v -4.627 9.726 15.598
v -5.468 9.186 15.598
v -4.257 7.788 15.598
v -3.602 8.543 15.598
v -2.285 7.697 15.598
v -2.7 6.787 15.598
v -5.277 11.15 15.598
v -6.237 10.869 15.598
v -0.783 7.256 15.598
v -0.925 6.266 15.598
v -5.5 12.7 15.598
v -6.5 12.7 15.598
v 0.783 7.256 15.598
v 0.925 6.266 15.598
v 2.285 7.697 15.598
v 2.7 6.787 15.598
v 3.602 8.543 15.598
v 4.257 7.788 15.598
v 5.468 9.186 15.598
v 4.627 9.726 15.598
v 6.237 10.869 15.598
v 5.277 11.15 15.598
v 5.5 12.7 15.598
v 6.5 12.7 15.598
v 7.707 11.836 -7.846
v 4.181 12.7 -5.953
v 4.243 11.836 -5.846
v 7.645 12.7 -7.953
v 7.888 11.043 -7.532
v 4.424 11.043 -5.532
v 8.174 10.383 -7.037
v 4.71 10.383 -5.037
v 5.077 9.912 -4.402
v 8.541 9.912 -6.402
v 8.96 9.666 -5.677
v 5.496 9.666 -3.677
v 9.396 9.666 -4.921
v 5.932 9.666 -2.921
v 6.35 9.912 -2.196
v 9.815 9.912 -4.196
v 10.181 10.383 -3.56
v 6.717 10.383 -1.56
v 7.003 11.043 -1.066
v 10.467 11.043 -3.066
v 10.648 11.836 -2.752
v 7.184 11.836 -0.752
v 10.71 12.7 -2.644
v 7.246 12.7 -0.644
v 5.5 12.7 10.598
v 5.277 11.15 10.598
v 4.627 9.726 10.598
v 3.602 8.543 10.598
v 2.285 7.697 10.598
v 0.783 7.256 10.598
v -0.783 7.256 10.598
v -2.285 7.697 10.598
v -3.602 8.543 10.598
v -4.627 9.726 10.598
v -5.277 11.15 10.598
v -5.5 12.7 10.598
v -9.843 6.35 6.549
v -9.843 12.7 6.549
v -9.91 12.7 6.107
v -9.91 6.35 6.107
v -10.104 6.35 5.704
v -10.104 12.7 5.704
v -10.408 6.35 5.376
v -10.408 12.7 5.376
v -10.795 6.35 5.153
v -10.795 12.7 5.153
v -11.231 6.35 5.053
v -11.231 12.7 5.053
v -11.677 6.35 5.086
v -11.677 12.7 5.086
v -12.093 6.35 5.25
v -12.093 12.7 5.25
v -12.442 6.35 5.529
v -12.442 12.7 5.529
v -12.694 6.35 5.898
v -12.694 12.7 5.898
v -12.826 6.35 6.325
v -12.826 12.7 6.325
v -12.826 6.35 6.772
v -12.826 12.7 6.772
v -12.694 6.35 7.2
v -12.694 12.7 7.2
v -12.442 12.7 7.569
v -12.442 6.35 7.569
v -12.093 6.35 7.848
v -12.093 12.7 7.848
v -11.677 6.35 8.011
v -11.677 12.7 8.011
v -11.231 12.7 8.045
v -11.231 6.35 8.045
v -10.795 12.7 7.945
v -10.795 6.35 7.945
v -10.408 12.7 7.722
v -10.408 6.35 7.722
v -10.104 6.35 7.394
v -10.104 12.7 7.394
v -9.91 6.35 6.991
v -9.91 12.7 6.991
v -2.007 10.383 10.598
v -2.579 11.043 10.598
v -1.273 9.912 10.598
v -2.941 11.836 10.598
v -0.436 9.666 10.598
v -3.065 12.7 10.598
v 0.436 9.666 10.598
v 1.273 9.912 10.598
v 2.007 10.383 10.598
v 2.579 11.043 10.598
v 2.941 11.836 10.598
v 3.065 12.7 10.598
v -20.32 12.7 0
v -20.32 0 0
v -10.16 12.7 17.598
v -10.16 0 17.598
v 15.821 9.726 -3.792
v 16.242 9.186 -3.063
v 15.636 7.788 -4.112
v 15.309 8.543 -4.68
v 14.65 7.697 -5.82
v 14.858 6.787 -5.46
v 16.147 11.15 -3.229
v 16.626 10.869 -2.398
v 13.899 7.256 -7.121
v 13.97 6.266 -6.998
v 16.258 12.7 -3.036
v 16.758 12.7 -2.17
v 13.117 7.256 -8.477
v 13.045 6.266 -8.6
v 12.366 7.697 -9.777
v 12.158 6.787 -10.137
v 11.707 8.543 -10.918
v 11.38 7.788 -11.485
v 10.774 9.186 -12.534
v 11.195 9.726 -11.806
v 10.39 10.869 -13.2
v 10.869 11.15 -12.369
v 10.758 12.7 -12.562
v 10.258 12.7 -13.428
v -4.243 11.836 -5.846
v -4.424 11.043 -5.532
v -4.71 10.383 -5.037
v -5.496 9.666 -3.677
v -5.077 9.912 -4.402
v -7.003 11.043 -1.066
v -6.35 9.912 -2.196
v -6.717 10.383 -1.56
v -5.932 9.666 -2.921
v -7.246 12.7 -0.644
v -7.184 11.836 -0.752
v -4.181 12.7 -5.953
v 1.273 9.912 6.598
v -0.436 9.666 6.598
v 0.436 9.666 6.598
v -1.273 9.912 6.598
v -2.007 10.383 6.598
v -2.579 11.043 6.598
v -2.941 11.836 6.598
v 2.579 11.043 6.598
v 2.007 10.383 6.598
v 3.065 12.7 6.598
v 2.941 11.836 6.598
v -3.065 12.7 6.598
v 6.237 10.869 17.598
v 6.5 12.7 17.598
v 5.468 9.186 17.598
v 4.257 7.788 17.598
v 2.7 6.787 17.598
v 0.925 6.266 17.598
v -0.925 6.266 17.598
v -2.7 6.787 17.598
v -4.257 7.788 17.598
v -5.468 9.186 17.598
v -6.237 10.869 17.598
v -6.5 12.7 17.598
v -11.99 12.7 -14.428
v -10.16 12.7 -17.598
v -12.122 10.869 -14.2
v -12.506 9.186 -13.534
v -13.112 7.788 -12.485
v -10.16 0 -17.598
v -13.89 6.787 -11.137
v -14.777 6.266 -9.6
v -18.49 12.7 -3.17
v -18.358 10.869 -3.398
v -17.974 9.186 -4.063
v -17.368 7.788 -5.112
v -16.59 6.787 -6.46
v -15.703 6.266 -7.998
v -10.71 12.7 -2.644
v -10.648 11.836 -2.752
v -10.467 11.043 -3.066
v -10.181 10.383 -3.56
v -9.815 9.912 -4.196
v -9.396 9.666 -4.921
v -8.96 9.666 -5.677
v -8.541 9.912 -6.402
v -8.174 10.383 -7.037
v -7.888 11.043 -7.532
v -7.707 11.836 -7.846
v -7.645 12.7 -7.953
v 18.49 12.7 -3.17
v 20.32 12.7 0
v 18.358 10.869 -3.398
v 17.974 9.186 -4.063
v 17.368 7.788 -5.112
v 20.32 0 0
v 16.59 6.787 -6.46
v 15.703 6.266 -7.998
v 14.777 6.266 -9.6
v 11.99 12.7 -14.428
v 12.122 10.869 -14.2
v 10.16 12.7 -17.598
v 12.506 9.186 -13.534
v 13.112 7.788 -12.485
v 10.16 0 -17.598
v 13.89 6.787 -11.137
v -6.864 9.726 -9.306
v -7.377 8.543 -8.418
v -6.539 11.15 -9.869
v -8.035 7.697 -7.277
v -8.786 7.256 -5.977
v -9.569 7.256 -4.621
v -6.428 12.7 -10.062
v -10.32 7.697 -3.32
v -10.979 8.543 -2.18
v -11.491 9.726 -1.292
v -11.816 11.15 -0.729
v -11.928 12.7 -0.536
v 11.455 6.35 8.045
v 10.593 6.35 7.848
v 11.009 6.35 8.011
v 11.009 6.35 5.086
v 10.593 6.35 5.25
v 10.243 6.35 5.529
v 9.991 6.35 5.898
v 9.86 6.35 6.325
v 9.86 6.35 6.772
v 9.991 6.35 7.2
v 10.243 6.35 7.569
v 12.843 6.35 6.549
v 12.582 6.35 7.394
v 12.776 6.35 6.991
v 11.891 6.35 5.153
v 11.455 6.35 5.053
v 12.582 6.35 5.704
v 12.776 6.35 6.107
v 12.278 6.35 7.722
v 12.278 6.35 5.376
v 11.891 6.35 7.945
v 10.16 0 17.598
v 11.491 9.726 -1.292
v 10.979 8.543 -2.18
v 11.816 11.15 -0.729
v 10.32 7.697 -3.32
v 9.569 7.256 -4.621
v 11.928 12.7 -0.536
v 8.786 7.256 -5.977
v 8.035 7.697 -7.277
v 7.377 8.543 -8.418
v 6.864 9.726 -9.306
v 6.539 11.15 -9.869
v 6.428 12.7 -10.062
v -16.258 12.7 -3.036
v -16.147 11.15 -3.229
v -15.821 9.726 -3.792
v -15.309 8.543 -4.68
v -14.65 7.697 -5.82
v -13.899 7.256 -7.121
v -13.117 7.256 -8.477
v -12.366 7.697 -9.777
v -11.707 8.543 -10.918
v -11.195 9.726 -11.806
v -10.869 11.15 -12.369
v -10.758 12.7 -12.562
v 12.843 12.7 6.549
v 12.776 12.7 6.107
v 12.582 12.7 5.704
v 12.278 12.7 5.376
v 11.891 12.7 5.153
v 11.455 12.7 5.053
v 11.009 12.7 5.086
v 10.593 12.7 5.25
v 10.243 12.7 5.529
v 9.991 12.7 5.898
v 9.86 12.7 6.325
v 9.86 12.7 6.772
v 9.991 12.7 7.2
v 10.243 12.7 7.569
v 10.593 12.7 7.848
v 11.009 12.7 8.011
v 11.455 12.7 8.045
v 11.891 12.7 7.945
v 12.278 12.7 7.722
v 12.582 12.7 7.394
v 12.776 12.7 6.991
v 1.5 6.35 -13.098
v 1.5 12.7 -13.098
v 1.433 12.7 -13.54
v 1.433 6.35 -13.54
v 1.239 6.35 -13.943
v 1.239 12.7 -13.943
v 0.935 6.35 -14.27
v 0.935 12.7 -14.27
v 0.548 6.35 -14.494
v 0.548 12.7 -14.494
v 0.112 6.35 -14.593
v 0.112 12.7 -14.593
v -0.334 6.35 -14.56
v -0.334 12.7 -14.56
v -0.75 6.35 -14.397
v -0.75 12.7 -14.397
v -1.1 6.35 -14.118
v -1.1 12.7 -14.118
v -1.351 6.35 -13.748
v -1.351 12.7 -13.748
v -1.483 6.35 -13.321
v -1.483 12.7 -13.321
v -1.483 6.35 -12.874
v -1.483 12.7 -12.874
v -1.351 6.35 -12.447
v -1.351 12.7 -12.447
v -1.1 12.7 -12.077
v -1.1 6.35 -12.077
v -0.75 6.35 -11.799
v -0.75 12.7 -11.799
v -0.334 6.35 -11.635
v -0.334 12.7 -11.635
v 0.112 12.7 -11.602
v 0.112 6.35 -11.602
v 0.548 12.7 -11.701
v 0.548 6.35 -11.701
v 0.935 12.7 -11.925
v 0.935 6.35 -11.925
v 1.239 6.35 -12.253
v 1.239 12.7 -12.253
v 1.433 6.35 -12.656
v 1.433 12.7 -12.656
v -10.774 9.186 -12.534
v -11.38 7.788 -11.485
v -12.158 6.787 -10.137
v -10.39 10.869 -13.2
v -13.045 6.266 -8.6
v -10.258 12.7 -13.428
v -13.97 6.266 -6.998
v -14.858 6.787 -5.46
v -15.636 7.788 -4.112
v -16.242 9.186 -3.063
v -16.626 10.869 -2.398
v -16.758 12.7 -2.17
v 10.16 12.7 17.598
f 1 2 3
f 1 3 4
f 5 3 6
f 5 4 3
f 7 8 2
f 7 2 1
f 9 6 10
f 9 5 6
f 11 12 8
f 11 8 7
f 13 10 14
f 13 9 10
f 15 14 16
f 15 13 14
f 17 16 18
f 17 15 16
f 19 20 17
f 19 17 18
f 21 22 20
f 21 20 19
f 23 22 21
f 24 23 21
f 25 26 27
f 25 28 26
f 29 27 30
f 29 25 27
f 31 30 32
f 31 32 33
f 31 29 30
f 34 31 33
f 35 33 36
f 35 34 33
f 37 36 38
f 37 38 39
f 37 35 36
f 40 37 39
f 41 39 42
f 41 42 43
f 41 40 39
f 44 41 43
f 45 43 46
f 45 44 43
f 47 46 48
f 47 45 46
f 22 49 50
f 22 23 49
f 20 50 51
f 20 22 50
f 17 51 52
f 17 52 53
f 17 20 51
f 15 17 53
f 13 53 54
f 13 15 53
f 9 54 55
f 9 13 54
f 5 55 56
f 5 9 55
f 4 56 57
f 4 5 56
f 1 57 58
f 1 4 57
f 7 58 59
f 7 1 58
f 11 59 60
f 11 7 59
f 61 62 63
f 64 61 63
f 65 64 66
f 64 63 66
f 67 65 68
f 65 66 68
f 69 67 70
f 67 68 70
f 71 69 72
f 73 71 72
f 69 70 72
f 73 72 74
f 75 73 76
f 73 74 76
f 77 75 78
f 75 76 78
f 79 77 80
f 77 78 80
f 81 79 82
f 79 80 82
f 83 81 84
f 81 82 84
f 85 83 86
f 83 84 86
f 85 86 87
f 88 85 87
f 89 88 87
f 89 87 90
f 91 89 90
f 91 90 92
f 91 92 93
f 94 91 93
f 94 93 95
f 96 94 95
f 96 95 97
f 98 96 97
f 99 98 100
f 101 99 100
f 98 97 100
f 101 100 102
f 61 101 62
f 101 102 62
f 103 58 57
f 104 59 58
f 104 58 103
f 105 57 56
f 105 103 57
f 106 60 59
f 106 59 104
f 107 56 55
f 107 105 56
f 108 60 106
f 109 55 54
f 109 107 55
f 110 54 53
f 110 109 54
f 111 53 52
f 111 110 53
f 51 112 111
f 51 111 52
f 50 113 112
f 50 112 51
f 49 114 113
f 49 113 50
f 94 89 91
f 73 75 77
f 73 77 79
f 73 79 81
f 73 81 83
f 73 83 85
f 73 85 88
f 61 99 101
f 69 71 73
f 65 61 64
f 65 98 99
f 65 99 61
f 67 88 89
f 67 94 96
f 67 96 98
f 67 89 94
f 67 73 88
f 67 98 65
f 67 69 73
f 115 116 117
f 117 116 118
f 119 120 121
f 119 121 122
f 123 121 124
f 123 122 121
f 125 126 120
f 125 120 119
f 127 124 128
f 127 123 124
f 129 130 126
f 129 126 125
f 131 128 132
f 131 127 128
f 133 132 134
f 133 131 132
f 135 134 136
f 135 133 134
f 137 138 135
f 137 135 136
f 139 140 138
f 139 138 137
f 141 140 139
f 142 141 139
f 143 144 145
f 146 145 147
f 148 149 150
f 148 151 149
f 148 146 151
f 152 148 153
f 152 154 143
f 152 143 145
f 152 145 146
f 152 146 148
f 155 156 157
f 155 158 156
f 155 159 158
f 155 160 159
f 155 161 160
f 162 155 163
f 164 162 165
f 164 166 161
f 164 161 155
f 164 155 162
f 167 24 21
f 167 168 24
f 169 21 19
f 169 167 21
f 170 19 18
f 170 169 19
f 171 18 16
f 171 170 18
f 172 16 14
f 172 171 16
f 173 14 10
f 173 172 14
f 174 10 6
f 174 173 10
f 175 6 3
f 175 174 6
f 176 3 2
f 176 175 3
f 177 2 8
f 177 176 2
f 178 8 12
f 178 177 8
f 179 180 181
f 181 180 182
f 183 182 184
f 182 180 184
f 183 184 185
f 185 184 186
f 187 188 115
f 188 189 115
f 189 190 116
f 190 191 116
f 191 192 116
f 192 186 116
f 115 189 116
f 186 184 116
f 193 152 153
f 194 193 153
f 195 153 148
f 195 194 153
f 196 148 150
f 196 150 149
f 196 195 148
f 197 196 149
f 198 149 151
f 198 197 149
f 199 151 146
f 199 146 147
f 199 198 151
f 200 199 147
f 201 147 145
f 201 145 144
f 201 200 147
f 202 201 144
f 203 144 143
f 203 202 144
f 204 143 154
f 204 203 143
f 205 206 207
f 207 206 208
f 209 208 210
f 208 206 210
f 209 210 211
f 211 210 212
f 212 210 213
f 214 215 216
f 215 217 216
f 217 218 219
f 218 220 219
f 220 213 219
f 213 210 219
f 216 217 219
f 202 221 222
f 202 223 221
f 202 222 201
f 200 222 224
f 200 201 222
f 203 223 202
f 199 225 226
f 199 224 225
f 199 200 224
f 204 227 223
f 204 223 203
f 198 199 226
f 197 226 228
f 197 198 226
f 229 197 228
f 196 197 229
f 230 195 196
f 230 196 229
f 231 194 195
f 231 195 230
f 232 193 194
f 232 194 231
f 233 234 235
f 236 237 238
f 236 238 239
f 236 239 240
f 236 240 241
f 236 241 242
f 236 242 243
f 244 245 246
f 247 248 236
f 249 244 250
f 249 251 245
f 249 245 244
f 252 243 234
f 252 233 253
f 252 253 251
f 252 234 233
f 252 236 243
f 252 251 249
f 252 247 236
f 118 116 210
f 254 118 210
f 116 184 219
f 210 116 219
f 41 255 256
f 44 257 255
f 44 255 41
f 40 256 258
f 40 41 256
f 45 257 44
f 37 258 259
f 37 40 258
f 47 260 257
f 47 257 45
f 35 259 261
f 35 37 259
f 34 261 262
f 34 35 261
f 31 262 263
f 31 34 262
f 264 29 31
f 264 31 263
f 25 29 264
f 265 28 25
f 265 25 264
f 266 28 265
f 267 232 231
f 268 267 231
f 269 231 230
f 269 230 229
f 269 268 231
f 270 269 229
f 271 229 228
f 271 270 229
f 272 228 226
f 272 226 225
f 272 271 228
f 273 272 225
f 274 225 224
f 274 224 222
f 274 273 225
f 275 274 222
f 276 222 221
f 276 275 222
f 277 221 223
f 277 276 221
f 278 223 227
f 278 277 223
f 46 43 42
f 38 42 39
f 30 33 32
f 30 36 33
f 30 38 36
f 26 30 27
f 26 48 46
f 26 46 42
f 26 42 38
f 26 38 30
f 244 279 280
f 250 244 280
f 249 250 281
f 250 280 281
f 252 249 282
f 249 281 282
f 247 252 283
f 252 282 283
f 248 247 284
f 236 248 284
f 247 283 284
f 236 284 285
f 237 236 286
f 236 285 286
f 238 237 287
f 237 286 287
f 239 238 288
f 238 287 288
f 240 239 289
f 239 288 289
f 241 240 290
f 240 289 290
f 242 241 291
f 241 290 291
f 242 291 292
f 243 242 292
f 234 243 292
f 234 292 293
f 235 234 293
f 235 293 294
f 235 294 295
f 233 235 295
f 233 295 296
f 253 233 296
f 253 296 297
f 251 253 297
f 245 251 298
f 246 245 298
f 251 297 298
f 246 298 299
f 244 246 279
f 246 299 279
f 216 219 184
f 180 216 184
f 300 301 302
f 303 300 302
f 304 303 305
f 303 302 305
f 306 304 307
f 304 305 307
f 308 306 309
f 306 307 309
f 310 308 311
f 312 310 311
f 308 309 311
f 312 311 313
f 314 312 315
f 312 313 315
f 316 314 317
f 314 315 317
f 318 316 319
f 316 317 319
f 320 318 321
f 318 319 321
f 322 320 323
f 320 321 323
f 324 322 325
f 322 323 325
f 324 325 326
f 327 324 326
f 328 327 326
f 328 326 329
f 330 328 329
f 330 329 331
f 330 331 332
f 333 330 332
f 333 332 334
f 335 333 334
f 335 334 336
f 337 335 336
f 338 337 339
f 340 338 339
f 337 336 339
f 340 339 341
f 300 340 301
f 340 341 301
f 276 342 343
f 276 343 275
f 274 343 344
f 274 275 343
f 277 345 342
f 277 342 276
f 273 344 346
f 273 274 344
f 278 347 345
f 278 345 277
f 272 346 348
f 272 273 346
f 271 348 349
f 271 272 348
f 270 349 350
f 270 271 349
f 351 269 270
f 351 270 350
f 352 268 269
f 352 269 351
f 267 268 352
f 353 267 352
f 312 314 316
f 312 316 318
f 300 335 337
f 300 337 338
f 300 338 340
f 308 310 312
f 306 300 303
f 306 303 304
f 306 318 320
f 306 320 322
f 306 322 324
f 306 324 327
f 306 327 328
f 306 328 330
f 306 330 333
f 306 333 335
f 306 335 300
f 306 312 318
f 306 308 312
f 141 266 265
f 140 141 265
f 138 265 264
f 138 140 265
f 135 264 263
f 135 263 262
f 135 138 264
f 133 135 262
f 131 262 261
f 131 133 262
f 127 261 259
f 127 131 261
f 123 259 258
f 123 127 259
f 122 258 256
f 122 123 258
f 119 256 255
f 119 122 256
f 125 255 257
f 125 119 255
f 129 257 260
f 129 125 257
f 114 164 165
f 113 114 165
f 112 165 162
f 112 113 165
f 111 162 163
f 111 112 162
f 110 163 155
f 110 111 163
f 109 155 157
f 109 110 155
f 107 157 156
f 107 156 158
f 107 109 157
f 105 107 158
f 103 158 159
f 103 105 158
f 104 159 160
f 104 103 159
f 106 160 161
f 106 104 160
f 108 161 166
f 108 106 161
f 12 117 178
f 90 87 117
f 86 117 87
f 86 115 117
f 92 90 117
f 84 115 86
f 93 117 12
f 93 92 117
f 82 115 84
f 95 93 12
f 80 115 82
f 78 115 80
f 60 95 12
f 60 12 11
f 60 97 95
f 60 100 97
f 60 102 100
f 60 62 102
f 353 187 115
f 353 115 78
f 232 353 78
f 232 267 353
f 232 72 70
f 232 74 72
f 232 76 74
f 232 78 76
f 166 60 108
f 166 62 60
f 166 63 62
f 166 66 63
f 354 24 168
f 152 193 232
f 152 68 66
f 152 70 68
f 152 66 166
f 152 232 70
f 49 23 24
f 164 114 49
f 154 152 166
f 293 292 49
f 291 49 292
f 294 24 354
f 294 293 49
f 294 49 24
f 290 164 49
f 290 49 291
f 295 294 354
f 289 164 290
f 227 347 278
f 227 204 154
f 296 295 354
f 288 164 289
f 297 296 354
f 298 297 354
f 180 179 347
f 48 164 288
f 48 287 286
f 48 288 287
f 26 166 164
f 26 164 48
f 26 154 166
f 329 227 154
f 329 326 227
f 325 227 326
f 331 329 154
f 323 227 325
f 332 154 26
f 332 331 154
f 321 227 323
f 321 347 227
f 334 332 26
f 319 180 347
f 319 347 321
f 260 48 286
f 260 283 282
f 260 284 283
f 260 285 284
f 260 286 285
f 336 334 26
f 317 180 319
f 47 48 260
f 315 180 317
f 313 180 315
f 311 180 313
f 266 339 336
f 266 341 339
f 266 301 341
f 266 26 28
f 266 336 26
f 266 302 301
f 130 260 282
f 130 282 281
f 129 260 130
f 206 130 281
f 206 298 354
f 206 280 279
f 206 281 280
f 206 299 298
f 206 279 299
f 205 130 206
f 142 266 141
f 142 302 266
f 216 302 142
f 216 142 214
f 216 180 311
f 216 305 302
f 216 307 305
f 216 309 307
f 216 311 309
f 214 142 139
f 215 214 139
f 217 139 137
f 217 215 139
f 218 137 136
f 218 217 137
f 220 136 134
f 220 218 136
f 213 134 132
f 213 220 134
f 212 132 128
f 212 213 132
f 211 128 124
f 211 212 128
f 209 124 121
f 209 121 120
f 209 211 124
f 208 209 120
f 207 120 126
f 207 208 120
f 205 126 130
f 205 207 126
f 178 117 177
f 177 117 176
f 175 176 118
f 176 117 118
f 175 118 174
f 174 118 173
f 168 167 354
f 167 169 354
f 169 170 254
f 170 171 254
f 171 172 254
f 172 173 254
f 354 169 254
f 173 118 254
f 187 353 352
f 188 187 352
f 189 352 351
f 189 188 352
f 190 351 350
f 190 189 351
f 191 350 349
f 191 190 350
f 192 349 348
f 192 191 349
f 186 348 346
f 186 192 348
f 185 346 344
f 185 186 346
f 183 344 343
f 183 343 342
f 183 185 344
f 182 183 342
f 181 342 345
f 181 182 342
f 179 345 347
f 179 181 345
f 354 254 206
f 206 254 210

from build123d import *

# Parameters (mm, degrees)
BOSS_EXTRUDE1_DEPTH = 12.7
CIRPATTERN1_COUNT   = 3
SKETCH7_R           = 1.5
CUT_EXTRUDE2_DEPTH  = 6.35


with BuildPart() as part:
    # Sketch1 → Boss-Extrude1 (new body)
    with BuildSketch(Plane(origin=(0, 0, 0), x_dir=(1, 0, 0), z_dir=(0, 1, 0))):
        Polygon((10.16, -17.597636205), (20.32, 0), (10.16, 17.597636205), (-10.16, 17.597636205), (-20.32, 0), (-10.16, -17.597636205), align=None)
    extrude(amount=BOSS_EXTRUDE1_DEPTH)

    # Sketch5 → Cut-Revolve1 (revolve, cut)
    with BuildSketch(Plane(origin=(0, 12.7, 0), x_dir=(1, 0, 0), z_dir=(0, 1, 0))):
        Polygon((0, -17.597636205), (0, -6.597636205), (-3.065310501, -6.597636205), (-3.065310501, -10.597636205), (-5.5, -10.597636205), (-5.5, -15.597636205), (-6.5, -15.597636205), (-6.5, -17.597636205), align=None)
    cut_revolve1 = revolve(axis=Axis((0, 12.7, 17.597636205), (0, 0, -1)), mode=Mode.SUBTRACT)

    # CirPattern1: Cut-Revolve1 ×3 about axis
    cirpattern1_axis = Axis((0, -0.635, 0), (0, 1, 0))
    for i in range(1, CIRPATTERN1_COUNT):
        add(cut_revolve1.rotate(cirpattern1_axis, i * 360 / CIRPATTERN1_COUNT), mode=Mode.SUBTRACT)

    # Sketch7 → Cut-Extrude2 (cut)
    with BuildSketch(Plane(origin=(0, 12.7, 0), x_dir=(1, 0, 0), z_dir=(0, 1, 0))):
        with Locations((0, 13.097636205)):
            Circle(SKETCH7_R)
        with Locations((11.342885683, -6.548818102)):
            Circle(SKETCH7_R)
        with Locations((-11.342885683, -6.548818102)):
            Circle(SKETCH7_R)
    extrude(amount=-CUT_EXTRUDE2_DEPTH, mode=Mode.SUBTRACT)


solid = part.part
